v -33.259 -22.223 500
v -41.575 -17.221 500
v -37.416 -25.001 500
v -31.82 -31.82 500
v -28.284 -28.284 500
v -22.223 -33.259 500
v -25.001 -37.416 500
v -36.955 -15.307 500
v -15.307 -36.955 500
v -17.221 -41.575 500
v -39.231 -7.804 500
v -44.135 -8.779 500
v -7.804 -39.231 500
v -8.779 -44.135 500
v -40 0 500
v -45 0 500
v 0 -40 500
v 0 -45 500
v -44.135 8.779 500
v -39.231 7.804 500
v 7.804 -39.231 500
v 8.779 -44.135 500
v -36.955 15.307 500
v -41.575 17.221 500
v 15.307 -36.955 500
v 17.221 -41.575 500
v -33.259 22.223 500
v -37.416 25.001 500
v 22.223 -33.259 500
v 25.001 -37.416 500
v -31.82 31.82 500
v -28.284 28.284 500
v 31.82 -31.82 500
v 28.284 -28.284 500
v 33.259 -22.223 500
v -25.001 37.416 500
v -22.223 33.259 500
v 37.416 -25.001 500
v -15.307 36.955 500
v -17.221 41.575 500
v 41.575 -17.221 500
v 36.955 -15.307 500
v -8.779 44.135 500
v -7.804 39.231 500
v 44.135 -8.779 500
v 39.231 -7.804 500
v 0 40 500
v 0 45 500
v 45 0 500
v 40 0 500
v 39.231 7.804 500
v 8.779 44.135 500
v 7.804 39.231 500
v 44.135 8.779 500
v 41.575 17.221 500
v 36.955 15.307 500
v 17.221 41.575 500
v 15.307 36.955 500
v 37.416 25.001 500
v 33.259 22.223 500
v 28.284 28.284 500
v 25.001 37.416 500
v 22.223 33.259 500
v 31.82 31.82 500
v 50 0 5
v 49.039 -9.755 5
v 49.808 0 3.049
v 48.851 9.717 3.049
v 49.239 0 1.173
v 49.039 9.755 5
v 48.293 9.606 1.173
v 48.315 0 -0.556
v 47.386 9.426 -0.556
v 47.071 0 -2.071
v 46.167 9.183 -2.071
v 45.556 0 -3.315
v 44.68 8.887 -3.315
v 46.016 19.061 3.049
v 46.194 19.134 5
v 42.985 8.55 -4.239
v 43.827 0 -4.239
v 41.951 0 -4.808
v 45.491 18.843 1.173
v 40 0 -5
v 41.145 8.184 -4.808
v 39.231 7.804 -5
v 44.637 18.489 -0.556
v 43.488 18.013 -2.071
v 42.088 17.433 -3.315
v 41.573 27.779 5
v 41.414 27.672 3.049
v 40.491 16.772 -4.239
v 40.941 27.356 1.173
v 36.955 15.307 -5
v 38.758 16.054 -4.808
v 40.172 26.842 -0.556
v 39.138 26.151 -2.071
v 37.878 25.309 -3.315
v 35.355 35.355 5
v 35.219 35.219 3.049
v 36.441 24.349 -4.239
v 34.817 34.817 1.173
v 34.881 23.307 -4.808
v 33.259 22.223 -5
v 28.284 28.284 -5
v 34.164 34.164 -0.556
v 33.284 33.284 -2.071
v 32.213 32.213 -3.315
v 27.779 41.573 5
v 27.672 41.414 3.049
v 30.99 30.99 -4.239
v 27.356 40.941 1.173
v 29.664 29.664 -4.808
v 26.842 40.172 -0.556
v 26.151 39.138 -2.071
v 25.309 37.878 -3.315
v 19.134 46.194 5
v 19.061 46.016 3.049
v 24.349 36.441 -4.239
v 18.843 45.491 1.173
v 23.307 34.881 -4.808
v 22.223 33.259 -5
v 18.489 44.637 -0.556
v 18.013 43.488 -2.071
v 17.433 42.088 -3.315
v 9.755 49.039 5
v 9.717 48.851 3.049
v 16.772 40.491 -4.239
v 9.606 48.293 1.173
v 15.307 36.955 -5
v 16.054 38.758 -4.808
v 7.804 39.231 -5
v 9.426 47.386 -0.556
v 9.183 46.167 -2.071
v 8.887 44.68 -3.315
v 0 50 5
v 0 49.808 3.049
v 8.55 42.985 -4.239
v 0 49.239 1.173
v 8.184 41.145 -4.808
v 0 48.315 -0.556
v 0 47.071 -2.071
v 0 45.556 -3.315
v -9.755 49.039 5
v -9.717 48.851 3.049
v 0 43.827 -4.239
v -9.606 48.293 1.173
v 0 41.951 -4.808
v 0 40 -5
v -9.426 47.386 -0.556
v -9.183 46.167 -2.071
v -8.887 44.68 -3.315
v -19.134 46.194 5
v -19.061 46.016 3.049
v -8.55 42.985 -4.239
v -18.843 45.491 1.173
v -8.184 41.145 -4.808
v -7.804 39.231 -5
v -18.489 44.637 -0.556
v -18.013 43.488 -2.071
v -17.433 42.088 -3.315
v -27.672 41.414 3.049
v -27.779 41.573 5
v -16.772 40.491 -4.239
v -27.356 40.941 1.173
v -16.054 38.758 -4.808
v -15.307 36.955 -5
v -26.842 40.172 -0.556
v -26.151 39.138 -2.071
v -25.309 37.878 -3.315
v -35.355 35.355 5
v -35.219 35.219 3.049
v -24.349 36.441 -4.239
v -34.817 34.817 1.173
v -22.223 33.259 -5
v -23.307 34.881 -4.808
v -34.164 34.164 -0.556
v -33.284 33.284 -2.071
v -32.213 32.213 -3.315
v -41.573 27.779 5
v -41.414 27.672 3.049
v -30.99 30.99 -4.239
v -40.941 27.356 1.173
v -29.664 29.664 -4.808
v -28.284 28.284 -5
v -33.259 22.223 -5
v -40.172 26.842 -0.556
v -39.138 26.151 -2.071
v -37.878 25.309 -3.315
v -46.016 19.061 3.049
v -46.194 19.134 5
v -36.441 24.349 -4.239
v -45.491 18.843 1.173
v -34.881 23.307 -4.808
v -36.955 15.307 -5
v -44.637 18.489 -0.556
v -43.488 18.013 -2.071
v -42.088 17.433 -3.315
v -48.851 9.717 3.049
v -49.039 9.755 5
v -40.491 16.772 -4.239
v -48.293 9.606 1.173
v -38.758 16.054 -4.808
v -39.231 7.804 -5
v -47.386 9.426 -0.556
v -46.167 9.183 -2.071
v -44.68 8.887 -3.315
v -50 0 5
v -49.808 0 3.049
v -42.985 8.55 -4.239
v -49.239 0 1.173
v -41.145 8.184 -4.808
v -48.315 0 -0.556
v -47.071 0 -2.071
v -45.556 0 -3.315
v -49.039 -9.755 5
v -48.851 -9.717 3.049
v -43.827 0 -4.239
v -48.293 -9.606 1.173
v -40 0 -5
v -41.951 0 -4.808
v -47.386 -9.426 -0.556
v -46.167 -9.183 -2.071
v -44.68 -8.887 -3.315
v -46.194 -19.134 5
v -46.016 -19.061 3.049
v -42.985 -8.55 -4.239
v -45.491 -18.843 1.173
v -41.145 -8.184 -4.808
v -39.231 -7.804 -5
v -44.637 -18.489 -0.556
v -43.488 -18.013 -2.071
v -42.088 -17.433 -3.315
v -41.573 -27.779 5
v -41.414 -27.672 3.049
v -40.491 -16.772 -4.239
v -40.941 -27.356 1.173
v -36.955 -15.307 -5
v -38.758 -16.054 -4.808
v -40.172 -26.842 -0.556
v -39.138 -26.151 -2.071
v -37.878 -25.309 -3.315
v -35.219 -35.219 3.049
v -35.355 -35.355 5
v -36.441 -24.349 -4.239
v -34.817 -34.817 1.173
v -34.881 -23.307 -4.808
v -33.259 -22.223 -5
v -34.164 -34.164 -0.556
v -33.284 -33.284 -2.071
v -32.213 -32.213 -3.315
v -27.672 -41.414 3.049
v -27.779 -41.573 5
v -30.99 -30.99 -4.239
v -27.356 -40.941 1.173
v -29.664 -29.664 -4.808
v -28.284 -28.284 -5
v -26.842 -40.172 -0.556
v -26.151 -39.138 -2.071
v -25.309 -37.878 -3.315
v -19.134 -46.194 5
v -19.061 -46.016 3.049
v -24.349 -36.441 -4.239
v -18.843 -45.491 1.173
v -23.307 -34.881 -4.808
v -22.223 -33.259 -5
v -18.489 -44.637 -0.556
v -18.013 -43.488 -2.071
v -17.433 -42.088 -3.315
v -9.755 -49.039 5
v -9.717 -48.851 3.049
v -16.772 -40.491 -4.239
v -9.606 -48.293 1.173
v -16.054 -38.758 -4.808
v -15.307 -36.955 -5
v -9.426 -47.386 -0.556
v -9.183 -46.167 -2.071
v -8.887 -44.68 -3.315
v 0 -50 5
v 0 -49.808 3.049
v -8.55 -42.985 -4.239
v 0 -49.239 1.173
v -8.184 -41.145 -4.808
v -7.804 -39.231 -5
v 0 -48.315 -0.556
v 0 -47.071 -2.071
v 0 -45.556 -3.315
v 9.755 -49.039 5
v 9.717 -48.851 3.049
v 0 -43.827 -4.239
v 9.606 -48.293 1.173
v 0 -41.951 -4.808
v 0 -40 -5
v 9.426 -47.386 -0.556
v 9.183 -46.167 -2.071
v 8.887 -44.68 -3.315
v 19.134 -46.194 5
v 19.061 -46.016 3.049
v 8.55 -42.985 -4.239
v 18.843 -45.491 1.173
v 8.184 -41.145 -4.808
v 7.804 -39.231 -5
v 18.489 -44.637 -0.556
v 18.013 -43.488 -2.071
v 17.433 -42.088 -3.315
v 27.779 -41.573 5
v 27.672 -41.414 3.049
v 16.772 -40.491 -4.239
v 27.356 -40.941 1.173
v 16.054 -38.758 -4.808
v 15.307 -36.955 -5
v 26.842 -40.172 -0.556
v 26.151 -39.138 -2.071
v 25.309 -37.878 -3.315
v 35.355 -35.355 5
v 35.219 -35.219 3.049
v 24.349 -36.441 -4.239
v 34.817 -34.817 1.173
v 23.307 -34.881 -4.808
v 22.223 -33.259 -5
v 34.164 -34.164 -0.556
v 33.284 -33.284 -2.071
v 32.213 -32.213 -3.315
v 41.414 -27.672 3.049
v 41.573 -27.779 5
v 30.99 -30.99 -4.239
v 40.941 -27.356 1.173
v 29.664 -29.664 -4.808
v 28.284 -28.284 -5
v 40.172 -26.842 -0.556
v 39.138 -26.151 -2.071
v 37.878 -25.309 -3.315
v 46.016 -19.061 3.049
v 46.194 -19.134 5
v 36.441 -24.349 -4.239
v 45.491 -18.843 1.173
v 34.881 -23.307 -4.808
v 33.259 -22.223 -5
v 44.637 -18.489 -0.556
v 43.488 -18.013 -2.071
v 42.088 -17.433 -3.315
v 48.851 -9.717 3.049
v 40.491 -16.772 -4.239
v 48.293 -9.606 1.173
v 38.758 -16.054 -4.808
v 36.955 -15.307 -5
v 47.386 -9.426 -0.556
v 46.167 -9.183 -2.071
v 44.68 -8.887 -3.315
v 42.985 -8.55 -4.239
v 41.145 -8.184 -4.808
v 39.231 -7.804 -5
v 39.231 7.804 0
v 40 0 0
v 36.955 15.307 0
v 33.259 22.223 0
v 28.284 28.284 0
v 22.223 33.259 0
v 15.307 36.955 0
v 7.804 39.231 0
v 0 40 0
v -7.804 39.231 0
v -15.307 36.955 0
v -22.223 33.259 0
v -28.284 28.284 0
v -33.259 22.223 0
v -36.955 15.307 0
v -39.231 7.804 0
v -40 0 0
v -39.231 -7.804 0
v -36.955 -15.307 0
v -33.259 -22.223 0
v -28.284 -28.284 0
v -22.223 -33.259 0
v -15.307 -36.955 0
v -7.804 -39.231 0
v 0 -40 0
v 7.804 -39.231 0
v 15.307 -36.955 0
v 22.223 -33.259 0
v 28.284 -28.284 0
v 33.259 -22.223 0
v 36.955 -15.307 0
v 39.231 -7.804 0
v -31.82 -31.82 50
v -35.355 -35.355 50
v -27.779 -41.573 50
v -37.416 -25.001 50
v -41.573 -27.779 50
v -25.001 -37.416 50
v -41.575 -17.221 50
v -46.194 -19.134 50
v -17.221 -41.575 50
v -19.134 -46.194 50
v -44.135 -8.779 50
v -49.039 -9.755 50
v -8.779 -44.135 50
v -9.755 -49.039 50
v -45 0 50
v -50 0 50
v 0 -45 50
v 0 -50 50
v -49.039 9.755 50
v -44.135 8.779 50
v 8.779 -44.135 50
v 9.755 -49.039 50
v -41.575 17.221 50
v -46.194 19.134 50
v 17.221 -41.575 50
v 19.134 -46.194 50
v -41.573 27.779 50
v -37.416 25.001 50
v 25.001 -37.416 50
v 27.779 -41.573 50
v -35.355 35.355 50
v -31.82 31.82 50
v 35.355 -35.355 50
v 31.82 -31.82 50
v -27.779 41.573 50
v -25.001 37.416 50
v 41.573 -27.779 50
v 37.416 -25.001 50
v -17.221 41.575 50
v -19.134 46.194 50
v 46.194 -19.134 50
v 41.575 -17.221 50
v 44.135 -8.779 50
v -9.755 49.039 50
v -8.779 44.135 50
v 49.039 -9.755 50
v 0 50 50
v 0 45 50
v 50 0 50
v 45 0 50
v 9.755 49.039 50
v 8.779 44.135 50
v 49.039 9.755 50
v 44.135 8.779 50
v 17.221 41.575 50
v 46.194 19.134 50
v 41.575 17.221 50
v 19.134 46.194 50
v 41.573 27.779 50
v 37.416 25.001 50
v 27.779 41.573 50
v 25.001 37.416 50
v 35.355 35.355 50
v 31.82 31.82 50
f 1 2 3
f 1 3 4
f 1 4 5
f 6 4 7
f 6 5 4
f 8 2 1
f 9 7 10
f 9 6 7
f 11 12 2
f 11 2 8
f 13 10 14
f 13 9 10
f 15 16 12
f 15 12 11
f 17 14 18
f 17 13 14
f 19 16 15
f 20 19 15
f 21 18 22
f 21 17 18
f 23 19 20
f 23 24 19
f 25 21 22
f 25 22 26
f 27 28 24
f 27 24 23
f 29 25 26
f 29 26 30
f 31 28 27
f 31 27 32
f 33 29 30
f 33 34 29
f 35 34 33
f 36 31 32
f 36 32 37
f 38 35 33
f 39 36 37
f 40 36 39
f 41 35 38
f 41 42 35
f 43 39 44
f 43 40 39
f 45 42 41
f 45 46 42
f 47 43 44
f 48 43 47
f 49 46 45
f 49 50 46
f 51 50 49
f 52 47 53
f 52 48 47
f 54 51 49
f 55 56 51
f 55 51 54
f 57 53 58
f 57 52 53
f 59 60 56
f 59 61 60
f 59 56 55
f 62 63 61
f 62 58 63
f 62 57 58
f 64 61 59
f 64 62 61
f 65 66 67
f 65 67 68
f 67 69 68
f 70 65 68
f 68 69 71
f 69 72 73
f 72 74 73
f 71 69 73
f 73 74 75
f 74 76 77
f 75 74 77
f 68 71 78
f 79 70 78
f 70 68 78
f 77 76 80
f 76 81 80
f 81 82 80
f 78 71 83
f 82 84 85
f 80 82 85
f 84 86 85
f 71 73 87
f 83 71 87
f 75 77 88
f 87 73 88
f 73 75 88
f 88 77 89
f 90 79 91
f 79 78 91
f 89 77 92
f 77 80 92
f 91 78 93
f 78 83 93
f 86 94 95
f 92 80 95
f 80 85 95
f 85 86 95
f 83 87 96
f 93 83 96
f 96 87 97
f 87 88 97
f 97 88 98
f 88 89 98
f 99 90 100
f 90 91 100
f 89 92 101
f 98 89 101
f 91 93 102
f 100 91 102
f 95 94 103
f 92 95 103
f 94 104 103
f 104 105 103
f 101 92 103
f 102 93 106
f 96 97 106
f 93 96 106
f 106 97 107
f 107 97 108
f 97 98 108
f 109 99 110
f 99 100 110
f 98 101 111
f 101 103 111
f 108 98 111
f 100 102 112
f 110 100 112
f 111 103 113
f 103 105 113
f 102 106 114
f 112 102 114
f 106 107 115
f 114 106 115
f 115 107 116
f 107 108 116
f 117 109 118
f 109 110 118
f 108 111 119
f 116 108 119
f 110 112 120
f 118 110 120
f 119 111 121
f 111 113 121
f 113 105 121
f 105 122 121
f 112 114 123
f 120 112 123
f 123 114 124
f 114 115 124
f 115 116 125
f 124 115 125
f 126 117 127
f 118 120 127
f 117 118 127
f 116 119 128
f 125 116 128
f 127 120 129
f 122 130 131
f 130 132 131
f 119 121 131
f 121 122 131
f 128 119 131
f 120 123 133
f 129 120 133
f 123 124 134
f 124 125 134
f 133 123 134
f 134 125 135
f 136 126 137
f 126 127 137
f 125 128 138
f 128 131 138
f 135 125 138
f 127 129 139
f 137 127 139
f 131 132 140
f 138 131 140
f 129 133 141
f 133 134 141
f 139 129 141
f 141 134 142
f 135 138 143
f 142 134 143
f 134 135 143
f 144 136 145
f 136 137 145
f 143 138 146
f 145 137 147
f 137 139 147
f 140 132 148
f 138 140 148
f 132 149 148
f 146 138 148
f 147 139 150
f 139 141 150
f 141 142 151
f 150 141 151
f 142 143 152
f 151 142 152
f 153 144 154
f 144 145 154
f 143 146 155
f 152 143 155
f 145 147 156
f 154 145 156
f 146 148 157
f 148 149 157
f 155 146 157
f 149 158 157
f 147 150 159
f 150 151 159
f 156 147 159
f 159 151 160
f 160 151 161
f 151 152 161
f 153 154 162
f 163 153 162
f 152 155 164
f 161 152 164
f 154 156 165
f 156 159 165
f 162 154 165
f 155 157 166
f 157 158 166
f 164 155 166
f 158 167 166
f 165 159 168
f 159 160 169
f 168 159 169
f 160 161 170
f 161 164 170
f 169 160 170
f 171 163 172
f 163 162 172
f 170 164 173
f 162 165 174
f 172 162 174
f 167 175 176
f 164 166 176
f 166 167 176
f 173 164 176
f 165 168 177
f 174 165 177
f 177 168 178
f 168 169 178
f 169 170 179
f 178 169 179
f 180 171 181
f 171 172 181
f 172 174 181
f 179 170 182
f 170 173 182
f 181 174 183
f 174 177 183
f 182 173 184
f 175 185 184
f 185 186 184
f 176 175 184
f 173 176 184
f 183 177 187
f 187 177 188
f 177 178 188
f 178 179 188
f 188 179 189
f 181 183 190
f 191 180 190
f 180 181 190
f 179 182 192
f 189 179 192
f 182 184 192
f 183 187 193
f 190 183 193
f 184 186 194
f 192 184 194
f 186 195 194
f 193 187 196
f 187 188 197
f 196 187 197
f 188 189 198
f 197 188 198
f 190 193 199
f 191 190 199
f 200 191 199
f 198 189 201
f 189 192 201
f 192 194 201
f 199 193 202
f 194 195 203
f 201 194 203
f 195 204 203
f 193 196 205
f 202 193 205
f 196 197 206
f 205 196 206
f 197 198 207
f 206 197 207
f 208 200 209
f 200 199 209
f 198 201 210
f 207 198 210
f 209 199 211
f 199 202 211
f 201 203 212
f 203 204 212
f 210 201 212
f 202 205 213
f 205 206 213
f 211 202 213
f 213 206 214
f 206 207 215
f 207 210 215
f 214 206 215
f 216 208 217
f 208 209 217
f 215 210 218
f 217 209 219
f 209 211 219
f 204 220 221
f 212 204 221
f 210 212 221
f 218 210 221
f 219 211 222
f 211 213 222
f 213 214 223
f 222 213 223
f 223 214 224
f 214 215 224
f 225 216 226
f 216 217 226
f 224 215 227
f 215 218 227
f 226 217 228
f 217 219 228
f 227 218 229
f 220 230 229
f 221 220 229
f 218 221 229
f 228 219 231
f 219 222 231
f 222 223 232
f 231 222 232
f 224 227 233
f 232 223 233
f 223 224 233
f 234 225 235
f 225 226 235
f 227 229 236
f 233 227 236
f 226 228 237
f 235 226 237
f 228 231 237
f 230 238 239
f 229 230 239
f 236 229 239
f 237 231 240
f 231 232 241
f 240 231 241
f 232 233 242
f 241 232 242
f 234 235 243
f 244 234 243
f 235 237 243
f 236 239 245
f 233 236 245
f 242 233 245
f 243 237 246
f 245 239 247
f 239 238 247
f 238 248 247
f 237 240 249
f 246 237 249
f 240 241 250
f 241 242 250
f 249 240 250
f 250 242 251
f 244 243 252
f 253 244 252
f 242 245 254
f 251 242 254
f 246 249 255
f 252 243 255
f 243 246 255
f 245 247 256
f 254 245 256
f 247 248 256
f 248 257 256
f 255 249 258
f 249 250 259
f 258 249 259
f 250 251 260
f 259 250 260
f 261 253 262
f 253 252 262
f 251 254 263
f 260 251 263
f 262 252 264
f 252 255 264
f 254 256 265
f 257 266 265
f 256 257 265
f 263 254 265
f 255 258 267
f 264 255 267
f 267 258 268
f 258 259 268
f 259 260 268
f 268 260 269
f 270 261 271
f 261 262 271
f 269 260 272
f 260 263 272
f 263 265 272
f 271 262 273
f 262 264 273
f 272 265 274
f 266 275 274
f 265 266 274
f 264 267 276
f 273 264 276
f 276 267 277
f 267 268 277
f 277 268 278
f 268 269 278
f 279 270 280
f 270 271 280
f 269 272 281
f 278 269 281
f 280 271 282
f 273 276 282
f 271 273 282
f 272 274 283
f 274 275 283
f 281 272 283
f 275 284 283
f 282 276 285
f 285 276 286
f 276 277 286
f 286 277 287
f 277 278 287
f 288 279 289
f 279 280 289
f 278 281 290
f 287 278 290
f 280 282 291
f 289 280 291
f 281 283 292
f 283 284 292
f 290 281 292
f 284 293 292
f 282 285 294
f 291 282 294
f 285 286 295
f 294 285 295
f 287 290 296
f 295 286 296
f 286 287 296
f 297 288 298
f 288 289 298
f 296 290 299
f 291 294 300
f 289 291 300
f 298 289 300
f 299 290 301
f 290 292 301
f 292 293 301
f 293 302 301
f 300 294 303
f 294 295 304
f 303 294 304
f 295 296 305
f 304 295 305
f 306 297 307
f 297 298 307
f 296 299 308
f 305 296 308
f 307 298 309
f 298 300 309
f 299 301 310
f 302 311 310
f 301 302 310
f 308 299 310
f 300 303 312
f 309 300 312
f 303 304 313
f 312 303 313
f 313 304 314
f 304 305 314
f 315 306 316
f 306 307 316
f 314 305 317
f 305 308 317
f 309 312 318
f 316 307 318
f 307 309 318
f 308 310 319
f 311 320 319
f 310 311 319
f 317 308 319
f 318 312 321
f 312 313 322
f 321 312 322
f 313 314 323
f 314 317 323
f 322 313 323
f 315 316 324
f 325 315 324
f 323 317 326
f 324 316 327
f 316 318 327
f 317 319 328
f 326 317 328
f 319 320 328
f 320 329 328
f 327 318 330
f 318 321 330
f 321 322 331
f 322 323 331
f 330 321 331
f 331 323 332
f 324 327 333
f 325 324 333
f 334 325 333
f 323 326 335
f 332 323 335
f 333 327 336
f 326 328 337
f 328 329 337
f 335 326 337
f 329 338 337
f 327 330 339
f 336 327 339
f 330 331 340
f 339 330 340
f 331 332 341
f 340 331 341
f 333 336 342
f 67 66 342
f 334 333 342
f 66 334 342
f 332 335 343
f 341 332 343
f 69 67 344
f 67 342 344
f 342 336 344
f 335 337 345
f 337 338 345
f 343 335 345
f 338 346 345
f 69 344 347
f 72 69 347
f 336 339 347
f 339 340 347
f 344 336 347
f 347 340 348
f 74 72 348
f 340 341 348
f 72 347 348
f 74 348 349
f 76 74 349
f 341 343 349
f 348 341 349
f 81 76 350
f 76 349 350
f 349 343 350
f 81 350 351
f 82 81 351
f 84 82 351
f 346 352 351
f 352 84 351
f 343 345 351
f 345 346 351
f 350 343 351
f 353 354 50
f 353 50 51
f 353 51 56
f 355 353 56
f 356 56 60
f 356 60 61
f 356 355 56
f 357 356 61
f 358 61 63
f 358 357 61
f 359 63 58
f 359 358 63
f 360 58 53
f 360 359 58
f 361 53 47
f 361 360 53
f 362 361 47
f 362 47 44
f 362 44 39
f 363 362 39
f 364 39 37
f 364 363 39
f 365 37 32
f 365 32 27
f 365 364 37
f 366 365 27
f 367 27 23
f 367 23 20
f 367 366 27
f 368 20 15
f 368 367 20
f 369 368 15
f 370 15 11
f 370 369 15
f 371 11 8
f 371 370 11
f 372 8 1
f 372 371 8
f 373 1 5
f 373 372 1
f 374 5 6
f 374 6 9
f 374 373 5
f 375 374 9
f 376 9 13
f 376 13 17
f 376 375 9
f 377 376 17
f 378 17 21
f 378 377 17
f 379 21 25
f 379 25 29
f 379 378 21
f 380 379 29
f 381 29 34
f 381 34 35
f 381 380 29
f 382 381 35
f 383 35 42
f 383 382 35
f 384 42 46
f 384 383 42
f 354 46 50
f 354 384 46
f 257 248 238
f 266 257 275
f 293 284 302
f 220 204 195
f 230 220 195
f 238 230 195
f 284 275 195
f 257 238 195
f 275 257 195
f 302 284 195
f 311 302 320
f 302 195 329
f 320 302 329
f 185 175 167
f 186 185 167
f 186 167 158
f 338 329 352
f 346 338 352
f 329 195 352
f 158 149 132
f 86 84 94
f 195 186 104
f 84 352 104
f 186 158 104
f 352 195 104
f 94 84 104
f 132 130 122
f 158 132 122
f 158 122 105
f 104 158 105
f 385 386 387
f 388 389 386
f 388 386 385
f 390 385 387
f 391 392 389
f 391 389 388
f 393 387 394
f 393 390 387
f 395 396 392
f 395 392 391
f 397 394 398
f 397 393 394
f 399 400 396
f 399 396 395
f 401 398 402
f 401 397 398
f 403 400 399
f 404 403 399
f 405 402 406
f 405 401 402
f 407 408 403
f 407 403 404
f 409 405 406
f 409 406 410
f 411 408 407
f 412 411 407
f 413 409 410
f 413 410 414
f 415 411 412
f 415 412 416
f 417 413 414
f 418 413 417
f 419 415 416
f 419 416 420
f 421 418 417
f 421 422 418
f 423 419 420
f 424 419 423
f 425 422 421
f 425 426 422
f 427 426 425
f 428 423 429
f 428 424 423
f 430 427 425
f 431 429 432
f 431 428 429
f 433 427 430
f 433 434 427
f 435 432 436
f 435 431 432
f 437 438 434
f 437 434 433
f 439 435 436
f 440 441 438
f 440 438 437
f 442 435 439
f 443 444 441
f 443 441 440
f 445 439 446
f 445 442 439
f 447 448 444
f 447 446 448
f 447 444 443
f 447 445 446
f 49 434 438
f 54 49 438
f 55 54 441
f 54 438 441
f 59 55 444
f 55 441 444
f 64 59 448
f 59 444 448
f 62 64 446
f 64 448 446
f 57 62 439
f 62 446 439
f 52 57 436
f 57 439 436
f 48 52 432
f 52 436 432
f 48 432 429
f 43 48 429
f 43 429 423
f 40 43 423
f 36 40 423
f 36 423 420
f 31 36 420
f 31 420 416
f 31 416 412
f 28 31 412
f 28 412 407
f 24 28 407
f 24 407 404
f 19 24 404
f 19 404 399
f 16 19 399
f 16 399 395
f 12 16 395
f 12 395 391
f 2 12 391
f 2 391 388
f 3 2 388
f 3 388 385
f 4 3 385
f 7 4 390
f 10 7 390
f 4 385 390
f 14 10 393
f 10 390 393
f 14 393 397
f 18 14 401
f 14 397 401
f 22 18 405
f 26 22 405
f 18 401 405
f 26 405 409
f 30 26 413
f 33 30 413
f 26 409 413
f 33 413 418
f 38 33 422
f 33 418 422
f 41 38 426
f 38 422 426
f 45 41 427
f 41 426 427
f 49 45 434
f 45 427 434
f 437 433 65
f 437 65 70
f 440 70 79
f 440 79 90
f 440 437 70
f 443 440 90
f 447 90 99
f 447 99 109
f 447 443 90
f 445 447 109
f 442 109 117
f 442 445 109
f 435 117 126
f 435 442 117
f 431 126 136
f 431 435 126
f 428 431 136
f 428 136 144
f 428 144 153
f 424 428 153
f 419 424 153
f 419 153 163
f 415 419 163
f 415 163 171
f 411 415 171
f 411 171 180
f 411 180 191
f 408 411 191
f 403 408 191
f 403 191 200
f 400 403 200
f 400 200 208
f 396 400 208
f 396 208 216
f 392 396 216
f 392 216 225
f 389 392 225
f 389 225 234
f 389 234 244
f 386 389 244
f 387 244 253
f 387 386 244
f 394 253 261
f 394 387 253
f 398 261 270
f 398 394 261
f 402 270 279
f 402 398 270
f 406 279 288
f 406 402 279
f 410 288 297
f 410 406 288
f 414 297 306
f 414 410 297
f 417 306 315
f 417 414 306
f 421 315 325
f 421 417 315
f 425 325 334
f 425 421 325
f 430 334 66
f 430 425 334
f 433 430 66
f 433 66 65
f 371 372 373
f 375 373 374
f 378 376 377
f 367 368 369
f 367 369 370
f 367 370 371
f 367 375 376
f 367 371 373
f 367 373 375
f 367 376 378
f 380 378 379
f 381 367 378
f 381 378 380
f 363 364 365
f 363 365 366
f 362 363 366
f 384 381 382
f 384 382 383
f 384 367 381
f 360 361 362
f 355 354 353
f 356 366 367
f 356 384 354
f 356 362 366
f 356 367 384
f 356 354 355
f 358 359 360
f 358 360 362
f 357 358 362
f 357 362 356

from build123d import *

# Parameters (mm, degrees)
F0_R     = 50
F0_R_2   = 45
F1_DEPTH = 50
F0_R_3   = 40
F2_DEPTH = 500
F3_DEPTH = 5
F4_R     = 10


with BuildPart() as f1:
    # F0 (on Top) → F1 (new body)
    with BuildSketch(Plane.XY):
        Circle(F0_R)
        Circle(F0_R_2, mode=Mode.SUBTRACT)
    extrude(amount=F1_DEPTH)

    # F0 (on Top) → F2 (join)
    with BuildSketch(Plane.XY):
        Circle(F0_R_2)
        Circle(F0_R_3, mode=Mode.SUBTRACT)
    extrude(amount=F2_DEPTH)

    # F0 (on Top) → F3 (join)
    with BuildSketch(Plane.XY):
        Circle(F0_R)
        Circle(F0_R_2, mode=Mode.SUBTRACT)
        Circle(F0_R_2)
        Circle(F0_R_3, mode=Mode.SUBTRACT)
        Circle(F0_R_3)
    extrude(amount=-F3_DEPTH)

    # F4
    f4_edges = [f1.edges().sort_by_distance(p)[0] for p in [
        (-50, 0, -5),
    ]]
    fillet(f4_edges, radius=F4_R)


solid = f1.part
